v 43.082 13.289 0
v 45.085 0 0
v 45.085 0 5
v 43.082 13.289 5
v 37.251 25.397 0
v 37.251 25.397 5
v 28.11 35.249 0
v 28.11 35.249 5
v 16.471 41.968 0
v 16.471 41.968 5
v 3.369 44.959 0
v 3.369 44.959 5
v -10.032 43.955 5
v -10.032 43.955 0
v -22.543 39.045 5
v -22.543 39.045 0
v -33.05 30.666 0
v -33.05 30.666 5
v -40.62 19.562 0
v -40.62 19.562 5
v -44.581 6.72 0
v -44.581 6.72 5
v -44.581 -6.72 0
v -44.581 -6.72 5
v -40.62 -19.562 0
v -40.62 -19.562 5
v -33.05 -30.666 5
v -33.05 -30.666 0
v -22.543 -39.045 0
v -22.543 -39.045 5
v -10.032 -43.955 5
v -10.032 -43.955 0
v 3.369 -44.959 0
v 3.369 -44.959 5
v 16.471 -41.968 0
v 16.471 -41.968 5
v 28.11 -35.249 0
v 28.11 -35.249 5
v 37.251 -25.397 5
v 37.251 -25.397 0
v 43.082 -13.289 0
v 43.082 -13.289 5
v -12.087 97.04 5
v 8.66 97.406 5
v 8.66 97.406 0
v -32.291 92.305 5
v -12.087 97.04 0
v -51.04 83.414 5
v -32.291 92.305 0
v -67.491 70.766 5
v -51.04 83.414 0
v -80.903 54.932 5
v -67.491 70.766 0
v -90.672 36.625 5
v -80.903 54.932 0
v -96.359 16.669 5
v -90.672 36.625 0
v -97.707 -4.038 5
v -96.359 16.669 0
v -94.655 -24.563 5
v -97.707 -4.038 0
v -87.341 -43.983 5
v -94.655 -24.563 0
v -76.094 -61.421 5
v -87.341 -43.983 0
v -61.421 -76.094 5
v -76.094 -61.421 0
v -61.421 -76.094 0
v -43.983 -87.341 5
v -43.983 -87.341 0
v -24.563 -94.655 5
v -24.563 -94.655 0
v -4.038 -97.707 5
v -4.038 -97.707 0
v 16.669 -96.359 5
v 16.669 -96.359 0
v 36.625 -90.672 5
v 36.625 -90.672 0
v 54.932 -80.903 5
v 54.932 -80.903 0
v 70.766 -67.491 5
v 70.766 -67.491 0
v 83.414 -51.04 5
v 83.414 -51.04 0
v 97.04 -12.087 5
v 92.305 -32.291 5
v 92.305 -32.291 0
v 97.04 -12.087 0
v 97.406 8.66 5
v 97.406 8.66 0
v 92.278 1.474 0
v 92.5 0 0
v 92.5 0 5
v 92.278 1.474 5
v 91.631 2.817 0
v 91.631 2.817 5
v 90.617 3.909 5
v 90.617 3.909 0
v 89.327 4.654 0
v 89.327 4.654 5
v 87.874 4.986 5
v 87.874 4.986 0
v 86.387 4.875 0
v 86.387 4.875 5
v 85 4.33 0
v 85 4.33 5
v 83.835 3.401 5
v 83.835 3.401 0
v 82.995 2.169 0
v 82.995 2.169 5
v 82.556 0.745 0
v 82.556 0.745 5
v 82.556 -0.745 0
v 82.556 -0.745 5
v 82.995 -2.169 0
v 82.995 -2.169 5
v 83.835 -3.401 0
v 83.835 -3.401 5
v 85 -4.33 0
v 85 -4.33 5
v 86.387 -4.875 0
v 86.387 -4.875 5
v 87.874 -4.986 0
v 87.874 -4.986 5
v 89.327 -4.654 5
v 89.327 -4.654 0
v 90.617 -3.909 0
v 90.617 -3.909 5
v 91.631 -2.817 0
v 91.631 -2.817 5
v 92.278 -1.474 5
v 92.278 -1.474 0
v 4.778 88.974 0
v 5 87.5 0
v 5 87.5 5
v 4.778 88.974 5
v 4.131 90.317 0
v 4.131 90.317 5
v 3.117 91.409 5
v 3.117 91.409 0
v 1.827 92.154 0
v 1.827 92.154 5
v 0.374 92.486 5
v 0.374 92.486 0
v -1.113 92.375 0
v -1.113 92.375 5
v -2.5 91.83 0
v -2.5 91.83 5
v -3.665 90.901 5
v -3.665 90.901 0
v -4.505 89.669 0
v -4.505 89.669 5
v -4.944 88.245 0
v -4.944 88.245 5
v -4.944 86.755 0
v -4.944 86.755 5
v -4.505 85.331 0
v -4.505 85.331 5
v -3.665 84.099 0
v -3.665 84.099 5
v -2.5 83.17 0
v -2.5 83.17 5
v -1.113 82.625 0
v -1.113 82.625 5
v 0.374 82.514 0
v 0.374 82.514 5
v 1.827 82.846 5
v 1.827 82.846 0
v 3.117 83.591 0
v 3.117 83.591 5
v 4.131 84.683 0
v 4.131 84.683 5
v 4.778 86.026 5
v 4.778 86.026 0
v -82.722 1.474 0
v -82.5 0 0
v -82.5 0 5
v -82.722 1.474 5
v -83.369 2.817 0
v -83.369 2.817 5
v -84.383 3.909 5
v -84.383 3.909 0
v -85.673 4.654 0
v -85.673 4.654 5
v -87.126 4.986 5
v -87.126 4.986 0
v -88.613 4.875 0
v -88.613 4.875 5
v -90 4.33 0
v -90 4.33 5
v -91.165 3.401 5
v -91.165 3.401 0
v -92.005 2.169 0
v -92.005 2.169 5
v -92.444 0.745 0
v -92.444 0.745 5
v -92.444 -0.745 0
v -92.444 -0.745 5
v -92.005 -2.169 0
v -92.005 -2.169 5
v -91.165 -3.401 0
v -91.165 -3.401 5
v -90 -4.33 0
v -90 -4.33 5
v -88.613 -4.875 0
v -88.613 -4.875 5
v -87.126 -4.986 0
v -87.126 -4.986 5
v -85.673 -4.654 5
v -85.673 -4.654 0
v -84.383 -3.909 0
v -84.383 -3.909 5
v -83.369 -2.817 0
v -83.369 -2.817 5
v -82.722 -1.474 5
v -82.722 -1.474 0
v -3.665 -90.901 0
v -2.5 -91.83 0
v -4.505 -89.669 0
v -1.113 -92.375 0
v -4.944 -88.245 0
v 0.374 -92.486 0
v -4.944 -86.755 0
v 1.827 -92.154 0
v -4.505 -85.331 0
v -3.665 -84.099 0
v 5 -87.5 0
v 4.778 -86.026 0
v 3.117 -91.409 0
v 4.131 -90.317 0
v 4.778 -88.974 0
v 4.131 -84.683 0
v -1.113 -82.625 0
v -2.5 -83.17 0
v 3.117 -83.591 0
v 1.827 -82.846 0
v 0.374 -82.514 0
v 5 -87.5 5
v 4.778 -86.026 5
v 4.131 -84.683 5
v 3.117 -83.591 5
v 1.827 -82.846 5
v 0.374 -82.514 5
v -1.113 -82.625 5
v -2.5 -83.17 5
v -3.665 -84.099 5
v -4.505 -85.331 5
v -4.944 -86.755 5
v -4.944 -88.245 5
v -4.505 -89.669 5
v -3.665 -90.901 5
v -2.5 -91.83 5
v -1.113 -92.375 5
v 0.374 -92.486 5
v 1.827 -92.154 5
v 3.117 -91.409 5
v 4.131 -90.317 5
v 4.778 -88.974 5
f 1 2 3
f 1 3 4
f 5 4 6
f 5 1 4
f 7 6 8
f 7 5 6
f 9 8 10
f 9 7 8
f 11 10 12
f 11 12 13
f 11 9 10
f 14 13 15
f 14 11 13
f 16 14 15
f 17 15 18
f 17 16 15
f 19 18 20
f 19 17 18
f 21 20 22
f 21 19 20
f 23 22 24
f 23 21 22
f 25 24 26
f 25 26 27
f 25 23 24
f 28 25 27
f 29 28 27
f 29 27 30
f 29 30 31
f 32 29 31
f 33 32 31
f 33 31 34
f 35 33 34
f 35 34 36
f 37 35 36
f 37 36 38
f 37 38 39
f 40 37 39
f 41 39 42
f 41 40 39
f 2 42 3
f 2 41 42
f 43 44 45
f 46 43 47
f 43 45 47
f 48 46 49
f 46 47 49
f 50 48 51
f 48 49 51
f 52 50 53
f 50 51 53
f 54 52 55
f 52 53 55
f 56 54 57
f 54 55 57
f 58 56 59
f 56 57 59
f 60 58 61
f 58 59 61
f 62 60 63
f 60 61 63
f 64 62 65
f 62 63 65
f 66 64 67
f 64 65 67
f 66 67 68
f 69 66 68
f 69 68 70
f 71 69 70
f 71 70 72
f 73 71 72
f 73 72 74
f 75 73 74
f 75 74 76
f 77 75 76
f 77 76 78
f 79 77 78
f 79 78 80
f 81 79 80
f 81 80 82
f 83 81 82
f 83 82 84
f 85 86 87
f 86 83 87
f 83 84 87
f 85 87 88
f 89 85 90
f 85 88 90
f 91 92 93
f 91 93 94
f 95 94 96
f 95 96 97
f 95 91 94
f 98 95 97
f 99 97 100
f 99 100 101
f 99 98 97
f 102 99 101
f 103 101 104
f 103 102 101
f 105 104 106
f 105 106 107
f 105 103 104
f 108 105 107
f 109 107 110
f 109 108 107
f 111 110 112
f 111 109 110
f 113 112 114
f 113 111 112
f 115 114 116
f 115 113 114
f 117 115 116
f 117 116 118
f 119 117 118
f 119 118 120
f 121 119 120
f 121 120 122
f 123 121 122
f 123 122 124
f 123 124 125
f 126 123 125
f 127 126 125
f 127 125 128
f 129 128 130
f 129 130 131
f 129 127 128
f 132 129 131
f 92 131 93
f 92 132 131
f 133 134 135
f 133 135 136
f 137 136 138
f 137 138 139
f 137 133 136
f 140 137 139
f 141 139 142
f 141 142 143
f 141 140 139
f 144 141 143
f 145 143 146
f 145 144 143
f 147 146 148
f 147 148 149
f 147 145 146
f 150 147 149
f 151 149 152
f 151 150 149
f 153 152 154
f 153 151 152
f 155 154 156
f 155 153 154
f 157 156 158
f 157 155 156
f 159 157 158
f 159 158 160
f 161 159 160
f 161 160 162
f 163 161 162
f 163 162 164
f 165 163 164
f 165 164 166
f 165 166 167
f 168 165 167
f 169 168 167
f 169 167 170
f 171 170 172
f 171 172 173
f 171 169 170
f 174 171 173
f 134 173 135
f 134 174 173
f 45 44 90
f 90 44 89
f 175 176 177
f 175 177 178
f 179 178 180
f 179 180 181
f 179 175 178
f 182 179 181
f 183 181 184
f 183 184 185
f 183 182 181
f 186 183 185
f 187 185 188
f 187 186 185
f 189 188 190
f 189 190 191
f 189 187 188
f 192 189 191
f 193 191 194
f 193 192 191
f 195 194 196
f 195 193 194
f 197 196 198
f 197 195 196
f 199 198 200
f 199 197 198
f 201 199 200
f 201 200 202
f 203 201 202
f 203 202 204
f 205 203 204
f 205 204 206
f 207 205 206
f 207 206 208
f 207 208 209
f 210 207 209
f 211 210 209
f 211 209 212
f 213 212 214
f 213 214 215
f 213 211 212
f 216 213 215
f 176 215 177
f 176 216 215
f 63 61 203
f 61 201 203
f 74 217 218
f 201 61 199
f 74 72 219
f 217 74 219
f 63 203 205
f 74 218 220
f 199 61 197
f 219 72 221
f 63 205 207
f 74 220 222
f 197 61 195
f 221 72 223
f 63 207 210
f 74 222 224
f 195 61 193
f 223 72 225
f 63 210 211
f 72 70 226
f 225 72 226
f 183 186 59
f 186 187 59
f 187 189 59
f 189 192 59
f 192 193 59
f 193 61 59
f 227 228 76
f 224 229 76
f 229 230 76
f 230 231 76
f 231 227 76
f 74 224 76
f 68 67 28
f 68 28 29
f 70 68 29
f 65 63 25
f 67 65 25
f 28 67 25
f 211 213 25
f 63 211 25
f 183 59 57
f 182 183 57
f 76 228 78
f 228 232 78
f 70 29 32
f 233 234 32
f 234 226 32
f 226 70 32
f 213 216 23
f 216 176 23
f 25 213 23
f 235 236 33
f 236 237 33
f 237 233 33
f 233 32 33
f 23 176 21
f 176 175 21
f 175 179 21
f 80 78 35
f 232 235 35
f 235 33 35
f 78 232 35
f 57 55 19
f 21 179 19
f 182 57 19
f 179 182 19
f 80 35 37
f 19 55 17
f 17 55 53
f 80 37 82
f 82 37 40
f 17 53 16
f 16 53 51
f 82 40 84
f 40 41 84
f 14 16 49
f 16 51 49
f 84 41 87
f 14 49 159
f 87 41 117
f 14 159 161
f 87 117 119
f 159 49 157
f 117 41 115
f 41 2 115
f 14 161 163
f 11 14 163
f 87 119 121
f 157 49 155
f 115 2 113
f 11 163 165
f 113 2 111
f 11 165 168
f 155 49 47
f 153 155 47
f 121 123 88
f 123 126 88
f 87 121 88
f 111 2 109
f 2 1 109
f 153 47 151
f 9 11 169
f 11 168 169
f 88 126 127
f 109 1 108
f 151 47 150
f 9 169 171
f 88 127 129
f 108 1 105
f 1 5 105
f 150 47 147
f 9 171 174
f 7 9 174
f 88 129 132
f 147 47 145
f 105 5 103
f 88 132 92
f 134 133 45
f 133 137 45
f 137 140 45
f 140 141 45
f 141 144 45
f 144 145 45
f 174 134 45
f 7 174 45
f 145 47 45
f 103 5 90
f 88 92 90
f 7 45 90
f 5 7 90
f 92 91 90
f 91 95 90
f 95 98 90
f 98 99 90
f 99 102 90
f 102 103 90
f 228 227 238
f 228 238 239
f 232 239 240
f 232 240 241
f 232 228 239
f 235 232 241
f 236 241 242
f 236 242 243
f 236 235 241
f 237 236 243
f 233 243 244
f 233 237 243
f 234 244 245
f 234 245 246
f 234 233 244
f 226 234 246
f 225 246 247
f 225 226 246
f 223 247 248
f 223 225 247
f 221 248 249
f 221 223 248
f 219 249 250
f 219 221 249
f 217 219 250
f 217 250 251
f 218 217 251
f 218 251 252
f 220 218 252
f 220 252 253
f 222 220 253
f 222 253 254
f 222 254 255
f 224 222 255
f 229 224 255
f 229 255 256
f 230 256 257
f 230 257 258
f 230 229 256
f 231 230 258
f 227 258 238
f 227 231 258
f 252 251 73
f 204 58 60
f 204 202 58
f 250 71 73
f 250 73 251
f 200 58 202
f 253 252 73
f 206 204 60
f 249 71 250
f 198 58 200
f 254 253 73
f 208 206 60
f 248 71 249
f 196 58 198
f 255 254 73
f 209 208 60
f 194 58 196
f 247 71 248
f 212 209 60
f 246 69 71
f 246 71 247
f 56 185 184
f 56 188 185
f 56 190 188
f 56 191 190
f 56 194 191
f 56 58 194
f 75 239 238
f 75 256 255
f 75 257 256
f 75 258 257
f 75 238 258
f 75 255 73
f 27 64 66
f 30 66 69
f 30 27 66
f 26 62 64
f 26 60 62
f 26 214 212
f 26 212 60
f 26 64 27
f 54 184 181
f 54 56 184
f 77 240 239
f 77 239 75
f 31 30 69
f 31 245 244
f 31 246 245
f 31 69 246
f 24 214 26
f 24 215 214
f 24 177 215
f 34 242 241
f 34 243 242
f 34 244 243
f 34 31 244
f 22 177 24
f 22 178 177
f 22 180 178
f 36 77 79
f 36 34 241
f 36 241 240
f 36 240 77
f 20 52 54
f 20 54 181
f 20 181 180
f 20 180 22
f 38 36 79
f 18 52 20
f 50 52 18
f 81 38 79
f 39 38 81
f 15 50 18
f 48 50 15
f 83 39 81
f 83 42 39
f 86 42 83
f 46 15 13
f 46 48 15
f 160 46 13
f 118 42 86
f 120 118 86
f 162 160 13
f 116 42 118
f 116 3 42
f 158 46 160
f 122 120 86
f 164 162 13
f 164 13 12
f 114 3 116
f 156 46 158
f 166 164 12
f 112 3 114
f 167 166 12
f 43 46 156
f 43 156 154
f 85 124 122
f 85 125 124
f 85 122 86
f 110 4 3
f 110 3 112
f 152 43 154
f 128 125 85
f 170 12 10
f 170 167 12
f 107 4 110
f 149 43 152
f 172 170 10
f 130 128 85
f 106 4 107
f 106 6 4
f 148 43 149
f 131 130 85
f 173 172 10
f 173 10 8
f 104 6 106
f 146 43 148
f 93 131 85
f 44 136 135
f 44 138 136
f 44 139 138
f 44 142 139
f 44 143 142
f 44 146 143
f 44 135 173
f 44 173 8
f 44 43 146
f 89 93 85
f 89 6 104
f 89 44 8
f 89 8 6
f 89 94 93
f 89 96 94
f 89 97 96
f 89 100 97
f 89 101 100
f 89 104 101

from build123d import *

# Parameters (mm, degrees)
F0_R     = 97.79
F0_R_2   = 5
F0_R_3   = 45.085
F1_DEPTH = 5
F3_DEPTH = 5.001


# Not quite as in the source:
# - a feature names something its author has since deleted; it is built from what else it names


with BuildPart() as f1:
    # F0 (on Top) → F1 (new body)
    with BuildSketch(Plane.XY):
        Circle(F0_R)
        with Locations((0, -87.5)):
            Circle(F0_R_2, mode=Mode.SUBTRACT)
        with Locations((-87.5, 0)):
            Circle(F0_R_2, mode=Mode.SUBTRACT)
        Circle(F0_R_3, mode=Mode.SUBTRACT)
        with Locations((87.5, 0)):
            Circle(F0_R_2, mode=Mode.SUBTRACT)
        with Locations((0, 87.5)):
            Circle(F0_R_2, mode=Mode.SUBTRACT)
    extrude(amount=F1_DEPTH)

    # F2 (on face) → F3 (cut, through all)
    with BuildSketch(Plane.XY.offset(5)):
        with BuildLine():
            ThreePointArc((97.4057710678, 8.6602461102), (69.1479721322, 69.1479721322), (8.6602461102, 97.4057710678))
            Line((8.6602461102, 97.4057710678), (97.4057710678, 8.6602461102))
        make_face()
    extrude(amount=-F3_DEPTH, mode=Mode.SUBTRACT)


solid = f1.part
